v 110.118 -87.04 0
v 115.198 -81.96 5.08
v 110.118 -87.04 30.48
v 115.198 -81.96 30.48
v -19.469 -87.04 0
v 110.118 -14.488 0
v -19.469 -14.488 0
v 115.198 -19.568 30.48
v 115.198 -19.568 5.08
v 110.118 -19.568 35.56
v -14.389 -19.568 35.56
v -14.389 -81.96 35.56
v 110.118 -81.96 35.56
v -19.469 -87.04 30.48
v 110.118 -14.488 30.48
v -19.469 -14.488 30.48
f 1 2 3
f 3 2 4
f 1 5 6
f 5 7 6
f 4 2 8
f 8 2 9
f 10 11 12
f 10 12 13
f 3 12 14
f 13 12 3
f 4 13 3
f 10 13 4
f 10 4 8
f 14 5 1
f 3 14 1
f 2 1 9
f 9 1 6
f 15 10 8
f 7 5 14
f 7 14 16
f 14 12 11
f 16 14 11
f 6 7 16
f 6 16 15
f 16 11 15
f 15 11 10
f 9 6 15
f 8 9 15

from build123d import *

# Parameters (mm, degrees)
F0_W     = 134.667195
F0_H     = 72.552154
F1_DEPTH = 35.56
F2_SIZE  = 5.08


with BuildPart() as f1:
    # F0 (on Top) → F1 (new body)
    with BuildSketch(Plane.XY):
        with Locations((47.864389, -50.7639)):
            Rectangle(F0_W, F0_H)
    extrude(amount=F1_DEPTH)

    # F2
    f2_edges = [f1.edges().sort_by_distance(p)[0] for p in [
        (47.864389, -14.487823, 35.56),
        (-19.469209, -50.7639, 35.56),
        (47.864389, -87.039977, 35.56),
        (115.197986, -50.7639, 35.56),
        (115.197986, -87.039977, 17.78),
        (115.197986, -14.487823, 17.78),
        (115.197986, -50.7639, 0),
    ]]
    chamfer(f2_edges, length=F2_SIZE)


solid = f1.part
